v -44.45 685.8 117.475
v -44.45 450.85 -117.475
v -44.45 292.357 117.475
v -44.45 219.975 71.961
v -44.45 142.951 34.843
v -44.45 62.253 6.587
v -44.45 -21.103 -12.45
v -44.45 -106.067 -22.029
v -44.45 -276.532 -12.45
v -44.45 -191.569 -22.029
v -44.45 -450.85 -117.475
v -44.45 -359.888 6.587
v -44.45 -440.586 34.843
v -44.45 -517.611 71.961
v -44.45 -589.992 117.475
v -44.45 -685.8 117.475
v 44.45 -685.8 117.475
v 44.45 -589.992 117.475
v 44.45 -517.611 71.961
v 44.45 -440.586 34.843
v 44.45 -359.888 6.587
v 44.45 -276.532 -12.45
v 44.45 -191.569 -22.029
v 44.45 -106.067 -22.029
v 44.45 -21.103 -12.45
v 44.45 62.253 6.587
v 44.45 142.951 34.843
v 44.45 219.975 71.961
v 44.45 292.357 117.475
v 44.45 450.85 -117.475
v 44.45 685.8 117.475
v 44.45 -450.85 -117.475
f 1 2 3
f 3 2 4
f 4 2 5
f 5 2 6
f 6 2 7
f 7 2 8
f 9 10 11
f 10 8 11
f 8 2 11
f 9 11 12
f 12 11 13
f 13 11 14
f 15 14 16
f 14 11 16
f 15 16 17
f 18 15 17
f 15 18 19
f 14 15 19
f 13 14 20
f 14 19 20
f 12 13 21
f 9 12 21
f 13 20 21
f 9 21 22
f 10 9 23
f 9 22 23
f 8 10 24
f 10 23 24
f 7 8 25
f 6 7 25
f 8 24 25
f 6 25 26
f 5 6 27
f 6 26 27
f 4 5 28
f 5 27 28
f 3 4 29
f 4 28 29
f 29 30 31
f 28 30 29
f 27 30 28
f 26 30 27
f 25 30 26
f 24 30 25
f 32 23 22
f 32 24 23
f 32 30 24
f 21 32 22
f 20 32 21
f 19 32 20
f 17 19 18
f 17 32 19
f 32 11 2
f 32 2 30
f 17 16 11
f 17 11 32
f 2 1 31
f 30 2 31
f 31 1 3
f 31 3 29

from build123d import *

# Parameters (mm, degrees)
F0_W     = 88.9
F0_H     = 234.95
F1_DEPTH = 685.8
F2_SIZE  = 234.94999
F3_SIZE  = 234.94999
F5_D     = 1524


# Not quite as in the source:
# - a fillet or chamfer is up to 0.001 mm smaller than in the source, because OpenCascade refuses the exact size


with BuildPart() as f1:
    # F0 (on Front) → F1 (new body, symmetric)
    with BuildSketch(Plane.XZ):
        Rectangle(F0_W, F0_H)
    extrude(amount=F1_DEPTH, both=True)

    # F2 (size 234.95 in the source; OpenCascade refuses exactly that, so slightly less here)
    f2_edges = [f1.edges().sort_by_distance(p)[0] for p in [
        (0, -685.8, -117.475),
    ]]
    chamfer(f2_edges, length=F2_SIZE)

    # F3 (size 234.95 in the source; OpenCascade refuses exactly that, so slightly less here)
    f3_edges = [f1.edges().sort_by_distance(p)[0] for p in [
        (0, 685.8, -117.475),
    ]]
    chamfer(f3_edges, length=F3_SIZE)

    # F5 (through all)
    with Locations(Plane(origin=(-44.45, 0, 0), x_dir=(0, -1, 0), z_dir=(-1, 0, 0))):
        with Locations((148.8177627325, 738.7712001801)):
            Hole(F5_D / 2)


solid = f1.part
